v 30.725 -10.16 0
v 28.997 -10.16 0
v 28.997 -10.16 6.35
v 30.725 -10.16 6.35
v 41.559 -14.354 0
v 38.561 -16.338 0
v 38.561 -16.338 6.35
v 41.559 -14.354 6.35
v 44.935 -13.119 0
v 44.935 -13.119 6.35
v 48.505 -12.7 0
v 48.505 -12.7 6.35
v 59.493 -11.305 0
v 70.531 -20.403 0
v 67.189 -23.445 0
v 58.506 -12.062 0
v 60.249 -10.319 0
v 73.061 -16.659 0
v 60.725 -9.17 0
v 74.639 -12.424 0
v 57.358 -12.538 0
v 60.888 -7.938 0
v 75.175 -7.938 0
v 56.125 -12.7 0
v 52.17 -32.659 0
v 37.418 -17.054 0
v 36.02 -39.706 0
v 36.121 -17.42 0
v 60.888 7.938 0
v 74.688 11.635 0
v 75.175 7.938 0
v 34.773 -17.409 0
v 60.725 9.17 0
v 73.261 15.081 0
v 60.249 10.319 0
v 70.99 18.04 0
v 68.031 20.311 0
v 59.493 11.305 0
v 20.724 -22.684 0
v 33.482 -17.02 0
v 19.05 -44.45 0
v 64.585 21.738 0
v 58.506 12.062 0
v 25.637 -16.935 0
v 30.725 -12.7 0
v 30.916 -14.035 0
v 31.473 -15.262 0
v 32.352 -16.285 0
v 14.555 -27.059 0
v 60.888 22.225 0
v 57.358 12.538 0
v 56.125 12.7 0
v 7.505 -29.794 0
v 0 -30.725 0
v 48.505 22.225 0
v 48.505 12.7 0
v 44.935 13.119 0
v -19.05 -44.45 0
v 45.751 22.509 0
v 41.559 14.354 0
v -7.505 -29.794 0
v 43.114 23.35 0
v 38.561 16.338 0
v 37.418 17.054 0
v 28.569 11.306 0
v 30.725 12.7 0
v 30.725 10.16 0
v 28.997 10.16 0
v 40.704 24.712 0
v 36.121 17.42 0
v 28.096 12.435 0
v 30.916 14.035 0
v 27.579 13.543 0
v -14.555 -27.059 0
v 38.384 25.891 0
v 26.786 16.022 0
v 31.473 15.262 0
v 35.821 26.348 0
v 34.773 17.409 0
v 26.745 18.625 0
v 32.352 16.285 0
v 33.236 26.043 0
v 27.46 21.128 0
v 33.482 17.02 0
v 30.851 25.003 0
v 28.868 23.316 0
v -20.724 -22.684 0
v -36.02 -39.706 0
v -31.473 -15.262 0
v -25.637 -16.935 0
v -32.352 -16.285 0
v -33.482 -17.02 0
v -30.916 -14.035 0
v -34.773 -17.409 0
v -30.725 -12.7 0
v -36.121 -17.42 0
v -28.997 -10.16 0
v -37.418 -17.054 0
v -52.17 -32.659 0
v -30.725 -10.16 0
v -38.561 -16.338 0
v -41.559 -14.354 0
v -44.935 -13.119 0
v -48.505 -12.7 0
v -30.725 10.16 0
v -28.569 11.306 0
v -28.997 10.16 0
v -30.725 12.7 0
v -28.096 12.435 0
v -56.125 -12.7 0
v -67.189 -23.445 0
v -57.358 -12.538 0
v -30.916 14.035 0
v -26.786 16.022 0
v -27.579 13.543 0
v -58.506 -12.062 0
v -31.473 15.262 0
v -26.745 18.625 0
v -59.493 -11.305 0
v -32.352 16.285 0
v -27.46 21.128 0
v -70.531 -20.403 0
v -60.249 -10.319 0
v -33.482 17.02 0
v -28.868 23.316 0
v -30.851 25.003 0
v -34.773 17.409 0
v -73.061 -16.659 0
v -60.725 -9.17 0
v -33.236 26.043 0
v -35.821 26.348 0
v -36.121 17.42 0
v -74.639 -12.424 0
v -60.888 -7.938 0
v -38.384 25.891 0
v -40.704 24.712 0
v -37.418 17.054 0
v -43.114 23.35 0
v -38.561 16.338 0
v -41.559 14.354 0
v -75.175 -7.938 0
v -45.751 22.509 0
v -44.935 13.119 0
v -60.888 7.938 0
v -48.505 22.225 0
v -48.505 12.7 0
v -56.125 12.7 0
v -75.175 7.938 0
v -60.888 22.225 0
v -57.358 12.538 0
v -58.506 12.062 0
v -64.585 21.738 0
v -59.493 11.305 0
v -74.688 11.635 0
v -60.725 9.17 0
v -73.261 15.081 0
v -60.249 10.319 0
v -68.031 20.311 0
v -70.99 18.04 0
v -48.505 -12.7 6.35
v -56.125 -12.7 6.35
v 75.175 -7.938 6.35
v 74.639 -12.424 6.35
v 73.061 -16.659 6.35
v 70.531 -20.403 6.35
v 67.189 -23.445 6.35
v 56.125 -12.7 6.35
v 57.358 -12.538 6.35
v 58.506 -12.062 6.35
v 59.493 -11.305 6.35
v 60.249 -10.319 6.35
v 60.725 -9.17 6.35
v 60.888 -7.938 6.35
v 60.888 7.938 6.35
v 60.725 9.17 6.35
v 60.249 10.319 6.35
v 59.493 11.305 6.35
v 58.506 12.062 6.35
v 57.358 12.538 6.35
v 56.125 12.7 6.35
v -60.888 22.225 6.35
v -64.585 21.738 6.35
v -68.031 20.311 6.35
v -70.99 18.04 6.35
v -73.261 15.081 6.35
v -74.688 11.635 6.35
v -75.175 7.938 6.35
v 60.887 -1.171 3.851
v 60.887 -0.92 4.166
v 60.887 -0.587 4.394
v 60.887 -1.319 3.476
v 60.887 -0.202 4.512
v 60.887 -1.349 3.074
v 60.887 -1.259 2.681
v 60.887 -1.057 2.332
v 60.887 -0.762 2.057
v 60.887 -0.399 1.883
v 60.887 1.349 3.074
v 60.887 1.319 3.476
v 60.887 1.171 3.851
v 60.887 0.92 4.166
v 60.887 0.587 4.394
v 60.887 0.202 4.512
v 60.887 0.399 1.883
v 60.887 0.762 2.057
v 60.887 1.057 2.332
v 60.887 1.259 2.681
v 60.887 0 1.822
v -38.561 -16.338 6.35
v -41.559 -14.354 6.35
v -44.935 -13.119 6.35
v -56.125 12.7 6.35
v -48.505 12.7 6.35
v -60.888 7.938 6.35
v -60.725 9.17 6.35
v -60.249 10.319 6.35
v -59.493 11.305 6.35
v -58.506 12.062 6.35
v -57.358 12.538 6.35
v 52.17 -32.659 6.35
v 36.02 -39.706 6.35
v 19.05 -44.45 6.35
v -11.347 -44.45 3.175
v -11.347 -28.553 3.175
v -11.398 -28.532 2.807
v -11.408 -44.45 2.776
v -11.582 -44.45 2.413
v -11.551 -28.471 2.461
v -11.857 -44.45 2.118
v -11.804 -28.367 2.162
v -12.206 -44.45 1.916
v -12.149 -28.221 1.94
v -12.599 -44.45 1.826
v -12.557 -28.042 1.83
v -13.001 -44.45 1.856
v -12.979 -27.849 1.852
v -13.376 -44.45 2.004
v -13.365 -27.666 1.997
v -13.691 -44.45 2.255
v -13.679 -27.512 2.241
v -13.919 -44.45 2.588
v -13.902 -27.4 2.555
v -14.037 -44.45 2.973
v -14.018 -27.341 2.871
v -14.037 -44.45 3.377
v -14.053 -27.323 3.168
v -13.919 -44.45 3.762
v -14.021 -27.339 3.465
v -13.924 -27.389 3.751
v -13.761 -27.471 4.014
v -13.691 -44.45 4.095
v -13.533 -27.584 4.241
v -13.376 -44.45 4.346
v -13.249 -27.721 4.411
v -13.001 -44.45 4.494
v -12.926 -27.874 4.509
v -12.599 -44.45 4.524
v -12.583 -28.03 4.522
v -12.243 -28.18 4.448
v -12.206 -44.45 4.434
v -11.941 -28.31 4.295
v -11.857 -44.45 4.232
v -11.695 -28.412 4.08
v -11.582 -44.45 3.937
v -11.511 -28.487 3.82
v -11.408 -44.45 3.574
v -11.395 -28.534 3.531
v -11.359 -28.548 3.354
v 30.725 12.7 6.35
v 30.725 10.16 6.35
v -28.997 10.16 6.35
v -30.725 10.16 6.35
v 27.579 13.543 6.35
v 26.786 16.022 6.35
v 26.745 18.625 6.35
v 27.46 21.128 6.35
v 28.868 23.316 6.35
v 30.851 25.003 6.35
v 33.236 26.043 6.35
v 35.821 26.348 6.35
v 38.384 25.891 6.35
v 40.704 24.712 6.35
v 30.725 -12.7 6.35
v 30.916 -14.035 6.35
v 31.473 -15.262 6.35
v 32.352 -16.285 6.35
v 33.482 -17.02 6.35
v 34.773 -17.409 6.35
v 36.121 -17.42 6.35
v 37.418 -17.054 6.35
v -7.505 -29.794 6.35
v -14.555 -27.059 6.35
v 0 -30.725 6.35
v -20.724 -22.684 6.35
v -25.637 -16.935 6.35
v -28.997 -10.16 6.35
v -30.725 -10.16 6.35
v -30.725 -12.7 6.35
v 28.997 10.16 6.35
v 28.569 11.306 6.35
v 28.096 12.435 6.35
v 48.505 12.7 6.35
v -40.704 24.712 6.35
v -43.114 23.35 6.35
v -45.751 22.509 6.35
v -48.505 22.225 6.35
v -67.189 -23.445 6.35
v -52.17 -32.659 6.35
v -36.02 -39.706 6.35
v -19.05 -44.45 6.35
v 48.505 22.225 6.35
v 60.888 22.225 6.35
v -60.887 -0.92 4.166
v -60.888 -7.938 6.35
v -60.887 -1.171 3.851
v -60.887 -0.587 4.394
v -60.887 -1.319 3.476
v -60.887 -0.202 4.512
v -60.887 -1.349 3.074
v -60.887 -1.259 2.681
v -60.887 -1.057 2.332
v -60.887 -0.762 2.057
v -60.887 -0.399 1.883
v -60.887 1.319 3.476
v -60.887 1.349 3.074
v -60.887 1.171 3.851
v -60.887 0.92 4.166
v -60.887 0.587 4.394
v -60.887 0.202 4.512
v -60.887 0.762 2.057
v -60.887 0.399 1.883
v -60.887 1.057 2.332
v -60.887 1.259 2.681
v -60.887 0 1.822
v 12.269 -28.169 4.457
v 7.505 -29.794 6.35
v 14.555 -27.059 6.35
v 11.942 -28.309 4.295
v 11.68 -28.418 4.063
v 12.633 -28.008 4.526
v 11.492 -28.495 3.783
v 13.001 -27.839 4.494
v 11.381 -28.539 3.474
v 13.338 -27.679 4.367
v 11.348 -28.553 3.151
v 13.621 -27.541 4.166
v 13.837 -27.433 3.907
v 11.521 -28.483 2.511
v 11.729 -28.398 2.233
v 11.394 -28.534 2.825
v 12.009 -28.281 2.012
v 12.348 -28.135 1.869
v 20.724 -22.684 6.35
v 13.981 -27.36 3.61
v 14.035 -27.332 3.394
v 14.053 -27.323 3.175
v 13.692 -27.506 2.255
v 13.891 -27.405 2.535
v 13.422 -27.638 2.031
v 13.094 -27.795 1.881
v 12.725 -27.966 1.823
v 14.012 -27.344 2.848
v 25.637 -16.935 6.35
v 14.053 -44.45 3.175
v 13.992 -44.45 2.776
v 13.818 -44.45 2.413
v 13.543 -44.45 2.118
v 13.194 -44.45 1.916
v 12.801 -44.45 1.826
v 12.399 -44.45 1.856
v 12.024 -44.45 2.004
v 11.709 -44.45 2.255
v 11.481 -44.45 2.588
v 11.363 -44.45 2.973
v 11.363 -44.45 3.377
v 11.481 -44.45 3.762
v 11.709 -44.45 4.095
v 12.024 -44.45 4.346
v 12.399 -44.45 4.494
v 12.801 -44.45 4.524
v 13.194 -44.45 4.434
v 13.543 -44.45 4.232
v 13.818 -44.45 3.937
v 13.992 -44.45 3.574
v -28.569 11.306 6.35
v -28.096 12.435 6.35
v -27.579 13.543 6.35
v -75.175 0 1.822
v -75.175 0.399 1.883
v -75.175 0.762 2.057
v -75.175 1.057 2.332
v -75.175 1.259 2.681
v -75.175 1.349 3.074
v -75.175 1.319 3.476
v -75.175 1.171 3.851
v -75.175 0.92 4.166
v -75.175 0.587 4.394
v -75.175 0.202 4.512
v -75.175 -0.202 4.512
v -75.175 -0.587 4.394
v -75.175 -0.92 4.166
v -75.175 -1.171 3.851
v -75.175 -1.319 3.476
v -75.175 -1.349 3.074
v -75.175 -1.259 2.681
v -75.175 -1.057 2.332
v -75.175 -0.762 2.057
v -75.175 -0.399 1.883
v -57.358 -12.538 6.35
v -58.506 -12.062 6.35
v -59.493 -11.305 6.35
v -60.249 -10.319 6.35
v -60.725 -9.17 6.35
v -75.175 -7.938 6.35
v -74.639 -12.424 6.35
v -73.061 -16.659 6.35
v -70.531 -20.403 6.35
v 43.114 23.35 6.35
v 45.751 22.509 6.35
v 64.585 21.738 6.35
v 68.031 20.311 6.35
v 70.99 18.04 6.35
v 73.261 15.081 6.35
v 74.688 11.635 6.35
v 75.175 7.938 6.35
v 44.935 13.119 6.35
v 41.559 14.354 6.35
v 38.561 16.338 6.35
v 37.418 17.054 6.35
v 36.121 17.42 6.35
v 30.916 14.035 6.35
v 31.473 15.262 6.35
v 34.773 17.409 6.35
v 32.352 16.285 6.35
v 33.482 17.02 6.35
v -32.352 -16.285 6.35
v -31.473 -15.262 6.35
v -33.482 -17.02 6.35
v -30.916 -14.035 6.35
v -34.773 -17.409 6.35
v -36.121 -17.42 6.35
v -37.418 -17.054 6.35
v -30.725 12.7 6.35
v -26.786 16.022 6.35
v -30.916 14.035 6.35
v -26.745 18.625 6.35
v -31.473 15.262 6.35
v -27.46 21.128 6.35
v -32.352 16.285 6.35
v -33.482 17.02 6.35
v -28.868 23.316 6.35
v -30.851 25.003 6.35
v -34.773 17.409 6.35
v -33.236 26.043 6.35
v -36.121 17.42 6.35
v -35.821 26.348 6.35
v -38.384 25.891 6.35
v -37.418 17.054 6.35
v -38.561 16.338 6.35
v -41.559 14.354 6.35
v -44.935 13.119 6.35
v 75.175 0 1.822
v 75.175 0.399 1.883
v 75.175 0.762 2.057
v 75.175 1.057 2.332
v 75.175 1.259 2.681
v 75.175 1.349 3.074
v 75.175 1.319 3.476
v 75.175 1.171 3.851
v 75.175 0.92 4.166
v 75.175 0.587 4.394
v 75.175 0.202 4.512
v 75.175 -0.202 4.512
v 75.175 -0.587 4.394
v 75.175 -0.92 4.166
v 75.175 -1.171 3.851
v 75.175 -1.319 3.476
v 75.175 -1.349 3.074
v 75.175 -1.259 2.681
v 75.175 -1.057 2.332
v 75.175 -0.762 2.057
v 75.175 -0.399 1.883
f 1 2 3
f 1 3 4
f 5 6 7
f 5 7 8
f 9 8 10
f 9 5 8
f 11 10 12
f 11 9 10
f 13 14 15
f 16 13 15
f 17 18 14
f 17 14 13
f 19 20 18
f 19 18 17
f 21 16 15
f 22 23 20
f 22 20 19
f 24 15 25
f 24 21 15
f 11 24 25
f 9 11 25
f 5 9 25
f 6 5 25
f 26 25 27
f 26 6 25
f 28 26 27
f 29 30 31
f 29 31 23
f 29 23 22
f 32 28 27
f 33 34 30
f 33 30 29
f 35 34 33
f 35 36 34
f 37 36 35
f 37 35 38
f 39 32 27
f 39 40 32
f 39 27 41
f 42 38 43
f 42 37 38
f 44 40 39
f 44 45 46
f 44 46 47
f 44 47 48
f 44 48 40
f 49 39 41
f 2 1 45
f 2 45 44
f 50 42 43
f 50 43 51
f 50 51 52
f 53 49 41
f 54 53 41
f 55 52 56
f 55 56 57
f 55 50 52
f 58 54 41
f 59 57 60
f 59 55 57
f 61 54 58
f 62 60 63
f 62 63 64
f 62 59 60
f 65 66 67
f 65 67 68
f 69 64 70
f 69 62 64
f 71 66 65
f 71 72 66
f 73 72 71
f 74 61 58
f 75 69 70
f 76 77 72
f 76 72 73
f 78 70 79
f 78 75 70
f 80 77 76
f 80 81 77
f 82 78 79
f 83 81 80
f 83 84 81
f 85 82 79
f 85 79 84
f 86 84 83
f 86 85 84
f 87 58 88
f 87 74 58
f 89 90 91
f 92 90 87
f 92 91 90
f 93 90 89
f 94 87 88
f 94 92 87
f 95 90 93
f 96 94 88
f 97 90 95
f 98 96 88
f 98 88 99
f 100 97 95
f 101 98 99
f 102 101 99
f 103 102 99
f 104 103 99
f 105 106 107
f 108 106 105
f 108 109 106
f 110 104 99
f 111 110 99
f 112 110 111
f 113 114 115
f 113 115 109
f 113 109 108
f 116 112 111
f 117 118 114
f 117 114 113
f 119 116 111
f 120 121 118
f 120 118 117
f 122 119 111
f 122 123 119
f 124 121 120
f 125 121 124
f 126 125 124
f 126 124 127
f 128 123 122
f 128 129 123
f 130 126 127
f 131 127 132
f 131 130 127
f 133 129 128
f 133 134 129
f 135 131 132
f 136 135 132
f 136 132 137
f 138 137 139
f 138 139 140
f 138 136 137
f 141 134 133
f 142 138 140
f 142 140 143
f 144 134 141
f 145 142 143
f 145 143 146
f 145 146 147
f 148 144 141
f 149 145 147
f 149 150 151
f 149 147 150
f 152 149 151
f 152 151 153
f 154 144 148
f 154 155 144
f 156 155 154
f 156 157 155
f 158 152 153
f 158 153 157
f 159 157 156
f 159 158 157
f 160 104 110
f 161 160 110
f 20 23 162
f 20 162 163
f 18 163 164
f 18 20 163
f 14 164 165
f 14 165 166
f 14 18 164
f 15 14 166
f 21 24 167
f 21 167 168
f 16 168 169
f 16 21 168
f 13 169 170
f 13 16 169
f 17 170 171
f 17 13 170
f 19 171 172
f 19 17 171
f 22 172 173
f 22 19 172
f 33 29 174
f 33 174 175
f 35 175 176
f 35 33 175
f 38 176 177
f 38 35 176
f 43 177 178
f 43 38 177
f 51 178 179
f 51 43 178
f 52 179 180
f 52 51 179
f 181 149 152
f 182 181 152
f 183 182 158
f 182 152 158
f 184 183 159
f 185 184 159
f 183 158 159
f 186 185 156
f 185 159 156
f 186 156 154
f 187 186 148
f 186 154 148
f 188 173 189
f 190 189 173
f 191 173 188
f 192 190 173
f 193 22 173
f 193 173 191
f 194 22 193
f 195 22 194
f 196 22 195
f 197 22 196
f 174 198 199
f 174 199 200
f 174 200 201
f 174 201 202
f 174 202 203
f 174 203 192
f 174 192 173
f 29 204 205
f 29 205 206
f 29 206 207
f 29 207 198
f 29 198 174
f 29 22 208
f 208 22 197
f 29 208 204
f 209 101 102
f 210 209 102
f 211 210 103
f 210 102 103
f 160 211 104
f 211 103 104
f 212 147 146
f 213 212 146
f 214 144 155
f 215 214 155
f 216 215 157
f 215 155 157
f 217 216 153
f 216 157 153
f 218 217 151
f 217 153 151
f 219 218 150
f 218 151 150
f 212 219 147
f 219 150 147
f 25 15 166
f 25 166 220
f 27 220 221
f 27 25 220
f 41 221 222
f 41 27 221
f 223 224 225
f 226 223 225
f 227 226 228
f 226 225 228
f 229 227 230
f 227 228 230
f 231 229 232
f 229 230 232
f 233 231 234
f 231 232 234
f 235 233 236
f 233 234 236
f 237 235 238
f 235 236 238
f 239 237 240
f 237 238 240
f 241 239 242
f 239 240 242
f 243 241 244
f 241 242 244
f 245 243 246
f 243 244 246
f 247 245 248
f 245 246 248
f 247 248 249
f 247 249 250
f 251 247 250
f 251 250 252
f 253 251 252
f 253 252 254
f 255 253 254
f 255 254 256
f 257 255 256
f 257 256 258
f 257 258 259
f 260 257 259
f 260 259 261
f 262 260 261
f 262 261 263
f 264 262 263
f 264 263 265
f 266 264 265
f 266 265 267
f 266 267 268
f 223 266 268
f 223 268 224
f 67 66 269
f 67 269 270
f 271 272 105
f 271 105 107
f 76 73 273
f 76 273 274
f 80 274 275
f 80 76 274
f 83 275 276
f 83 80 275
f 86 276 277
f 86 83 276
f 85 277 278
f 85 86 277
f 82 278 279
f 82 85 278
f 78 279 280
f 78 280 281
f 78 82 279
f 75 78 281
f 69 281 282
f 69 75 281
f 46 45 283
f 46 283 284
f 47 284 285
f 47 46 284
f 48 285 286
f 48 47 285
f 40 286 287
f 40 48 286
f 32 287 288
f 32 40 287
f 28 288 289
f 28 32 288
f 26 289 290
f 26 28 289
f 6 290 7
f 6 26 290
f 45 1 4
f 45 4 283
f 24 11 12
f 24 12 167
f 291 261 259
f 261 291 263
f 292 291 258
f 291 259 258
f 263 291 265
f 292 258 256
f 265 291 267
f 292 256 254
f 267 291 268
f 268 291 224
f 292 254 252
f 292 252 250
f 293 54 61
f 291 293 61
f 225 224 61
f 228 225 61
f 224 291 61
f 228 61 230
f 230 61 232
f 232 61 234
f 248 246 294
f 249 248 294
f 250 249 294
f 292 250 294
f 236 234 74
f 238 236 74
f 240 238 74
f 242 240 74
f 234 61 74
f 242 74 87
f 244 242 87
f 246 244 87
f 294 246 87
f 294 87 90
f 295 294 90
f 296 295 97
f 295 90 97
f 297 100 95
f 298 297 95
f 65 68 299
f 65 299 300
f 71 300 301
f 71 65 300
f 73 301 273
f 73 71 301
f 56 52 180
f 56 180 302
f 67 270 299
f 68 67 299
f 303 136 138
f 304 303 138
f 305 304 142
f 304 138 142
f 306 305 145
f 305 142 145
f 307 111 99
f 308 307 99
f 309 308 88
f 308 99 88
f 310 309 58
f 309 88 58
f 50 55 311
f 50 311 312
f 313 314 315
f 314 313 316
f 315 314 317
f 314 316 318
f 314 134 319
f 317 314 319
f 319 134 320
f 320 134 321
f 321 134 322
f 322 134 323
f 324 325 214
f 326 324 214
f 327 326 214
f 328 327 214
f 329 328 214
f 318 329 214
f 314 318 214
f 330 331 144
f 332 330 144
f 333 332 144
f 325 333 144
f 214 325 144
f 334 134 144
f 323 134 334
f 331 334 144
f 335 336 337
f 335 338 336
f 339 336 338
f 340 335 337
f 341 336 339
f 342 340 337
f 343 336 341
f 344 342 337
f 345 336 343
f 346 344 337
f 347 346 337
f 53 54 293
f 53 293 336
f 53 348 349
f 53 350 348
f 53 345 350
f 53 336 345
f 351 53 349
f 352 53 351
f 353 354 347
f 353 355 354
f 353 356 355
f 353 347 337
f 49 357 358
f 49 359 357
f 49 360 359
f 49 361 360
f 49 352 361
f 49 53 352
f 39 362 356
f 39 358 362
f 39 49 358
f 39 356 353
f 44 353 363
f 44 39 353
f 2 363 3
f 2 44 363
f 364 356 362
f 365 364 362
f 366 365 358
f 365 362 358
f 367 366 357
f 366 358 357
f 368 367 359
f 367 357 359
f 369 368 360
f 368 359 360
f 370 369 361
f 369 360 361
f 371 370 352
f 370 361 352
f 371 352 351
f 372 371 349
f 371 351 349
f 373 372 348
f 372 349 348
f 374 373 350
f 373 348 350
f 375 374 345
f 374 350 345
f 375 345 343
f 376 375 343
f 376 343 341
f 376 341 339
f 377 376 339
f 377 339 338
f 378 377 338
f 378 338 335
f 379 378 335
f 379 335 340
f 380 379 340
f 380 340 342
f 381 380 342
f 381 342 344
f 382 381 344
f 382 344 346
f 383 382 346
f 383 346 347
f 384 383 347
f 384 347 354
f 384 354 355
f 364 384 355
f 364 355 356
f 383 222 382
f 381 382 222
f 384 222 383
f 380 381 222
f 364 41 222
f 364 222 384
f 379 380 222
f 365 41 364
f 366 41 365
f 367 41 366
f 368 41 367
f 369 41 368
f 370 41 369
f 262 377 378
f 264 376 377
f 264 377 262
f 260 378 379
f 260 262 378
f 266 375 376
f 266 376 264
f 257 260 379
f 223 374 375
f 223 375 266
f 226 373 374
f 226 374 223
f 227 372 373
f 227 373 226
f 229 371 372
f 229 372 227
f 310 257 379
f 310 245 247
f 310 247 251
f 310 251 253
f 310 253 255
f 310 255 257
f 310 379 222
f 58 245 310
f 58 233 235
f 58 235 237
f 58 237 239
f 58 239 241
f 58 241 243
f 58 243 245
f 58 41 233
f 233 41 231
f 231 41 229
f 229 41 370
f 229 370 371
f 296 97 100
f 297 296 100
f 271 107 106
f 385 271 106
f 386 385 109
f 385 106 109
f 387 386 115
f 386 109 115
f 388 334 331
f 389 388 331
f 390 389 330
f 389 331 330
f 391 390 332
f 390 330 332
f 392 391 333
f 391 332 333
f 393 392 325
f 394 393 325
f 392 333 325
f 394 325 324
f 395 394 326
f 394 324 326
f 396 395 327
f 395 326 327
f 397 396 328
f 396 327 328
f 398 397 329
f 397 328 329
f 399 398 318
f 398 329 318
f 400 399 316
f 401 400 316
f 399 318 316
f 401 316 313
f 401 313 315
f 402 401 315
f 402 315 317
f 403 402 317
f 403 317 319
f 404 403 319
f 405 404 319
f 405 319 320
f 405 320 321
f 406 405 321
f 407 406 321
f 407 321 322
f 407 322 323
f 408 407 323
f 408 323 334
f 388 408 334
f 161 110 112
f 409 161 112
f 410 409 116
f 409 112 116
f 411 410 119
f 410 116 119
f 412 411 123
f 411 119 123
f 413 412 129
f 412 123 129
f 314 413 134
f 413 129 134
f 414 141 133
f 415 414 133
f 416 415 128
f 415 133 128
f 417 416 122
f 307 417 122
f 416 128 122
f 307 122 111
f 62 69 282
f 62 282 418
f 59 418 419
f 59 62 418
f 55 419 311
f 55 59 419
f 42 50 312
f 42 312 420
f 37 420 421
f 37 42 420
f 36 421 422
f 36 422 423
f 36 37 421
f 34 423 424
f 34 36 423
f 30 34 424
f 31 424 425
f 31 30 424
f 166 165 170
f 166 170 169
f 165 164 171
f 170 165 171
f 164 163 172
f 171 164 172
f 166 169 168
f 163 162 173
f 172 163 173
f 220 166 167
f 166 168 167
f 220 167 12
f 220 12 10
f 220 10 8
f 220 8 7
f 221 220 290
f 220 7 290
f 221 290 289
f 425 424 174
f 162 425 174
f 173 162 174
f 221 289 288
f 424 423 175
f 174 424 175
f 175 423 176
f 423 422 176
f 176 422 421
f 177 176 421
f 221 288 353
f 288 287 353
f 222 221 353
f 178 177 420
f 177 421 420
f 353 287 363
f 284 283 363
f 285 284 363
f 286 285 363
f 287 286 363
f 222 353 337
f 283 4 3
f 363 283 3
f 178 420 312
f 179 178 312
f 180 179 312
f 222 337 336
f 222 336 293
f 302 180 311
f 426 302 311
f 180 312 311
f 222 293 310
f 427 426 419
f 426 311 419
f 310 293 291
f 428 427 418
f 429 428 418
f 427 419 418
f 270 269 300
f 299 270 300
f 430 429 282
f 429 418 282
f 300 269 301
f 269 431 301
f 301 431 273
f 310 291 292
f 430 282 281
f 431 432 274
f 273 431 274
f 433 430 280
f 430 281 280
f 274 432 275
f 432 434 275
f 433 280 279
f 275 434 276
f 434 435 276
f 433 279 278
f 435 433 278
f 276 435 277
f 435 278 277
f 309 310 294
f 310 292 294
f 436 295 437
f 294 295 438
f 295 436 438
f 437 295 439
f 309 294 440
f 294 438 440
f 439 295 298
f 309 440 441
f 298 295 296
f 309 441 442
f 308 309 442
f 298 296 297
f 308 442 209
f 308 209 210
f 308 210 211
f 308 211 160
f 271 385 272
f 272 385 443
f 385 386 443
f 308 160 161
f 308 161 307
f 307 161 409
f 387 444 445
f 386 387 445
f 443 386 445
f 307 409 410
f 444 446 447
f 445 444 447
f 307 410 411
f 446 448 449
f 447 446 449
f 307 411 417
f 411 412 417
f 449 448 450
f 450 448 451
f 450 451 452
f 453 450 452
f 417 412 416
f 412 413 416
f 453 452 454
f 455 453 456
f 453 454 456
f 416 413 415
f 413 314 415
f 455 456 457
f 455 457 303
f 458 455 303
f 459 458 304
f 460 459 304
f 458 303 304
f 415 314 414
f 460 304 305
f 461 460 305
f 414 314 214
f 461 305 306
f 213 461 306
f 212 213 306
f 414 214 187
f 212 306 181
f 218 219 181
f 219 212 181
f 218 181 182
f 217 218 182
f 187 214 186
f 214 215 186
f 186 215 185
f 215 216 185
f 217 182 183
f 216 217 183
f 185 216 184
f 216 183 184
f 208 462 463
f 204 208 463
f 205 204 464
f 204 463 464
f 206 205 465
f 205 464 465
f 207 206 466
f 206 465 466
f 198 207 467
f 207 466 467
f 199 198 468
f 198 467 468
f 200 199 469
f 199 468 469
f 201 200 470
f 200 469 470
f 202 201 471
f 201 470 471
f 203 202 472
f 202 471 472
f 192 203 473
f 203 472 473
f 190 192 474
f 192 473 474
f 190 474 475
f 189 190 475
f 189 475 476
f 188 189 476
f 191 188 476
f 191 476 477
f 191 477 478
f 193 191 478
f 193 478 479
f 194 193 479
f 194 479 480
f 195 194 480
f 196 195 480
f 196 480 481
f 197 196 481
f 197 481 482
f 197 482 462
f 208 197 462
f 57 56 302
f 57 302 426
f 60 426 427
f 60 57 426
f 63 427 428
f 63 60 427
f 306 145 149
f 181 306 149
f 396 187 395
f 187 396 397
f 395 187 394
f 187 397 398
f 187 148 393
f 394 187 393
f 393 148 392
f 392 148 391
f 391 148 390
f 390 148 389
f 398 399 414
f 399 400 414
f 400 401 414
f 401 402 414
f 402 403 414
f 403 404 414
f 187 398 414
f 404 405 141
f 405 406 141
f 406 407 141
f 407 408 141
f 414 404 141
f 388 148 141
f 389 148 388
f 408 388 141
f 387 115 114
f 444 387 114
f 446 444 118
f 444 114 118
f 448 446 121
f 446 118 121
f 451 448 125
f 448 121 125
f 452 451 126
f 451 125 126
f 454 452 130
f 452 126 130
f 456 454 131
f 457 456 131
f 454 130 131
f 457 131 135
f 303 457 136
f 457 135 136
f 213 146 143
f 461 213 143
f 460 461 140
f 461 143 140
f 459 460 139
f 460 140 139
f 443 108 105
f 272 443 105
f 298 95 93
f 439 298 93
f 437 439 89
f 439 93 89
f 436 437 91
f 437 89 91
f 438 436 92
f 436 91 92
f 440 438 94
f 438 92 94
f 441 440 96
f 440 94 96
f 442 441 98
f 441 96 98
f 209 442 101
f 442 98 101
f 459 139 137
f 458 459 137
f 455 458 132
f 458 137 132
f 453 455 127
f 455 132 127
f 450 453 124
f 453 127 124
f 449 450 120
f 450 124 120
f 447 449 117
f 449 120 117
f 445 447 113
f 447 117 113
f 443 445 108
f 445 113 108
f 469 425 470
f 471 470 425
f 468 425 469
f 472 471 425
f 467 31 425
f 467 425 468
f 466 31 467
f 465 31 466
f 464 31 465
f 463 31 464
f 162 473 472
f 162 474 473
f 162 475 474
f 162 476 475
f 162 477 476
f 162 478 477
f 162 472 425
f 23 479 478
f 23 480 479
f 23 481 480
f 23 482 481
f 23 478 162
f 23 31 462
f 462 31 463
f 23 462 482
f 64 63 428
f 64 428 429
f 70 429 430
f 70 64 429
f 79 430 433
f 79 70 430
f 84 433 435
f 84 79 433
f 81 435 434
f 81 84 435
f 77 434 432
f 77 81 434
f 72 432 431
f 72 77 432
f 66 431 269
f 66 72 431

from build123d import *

# Parameters (mm, degrees)
BOSS_EXTRUDE1_DEPTH   = 6.35
F_6_32_TAPPED_HOLE2_D = 2.7051
F_6_32_TAPPED_HOLE1_D = 2.7051


with BuildPart() as part:
    # Sketch1 → Boss-Extrude1 (new body)
    with BuildSketch(Plane.XY):
        with BuildLine():
            Line((-30.725, 12.7), (-30.725, 10.16))
            Line((-30.725, 10.16), (-28.99655195, 10.16))
            ThreePointArc((-28.99655195, 10.16), (-28.338337344, 11.872837132), (-27.579048351, 13.5433274))
            ThreePointArc((-27.579048351, 13.5433274), (-29.797475058, 24.232437752), (-40.703834208, 24.711840767))
            ThreePointArc((-40.703834208, 24.711840767), (-44.411023794, 22.861749744), (-48.505, 22.225))
            Line((-48.505, 22.225), (-60.8875, 22.225))
            ThreePointArc((-60.8875, 22.225), (-70.990288136, 18.040288136), (-75.175, 7.9375))
            Line((-75.175, 7.9375), (-75.175, -7.9375))
            ThreePointArc((-75.175, -7.9375), (-73.061327111, -16.658929011), (-67.189349187, -23.445003896))
            ThreePointArc((-67.189349187, -23.445003896), (-44.21739693, -36.463267178), (-19.05, -44.45))
            Line((-19.05, -44.45), (0, -44.45))
            Line((0, -44.45), (0, -30.725))
            ThreePointArc((0, -30.725), (-17.774414547, -25.061839767), (-28.99655195, -10.16))
            Line((-28.99655195, -10.16), (-30.725, -10.16))
            Line((-30.725, -10.16), (-30.725, -12.7))
            ThreePointArc((-30.725, -12.7), (-33.481957403, -17.019630209), (-38.560886674, -16.338090241))
            ThreePointArc((-38.560886674, -16.338090241), (-43.210637658, -13.638076264), (-48.505, -12.7))
            Line((-48.505, -12.7), (-56.125, -12.7))
            ThreePointArc((-56.125, -12.7), (-59.492596045, -11.305096045), (-60.8875, -7.9375))
            Line((-60.8875, -7.9375), (-60.8875, 7.9375))
            ThreePointArc((-60.8875, 7.9375), (-59.492596045, 11.305096045), (-56.125, 12.7))
            Line((-56.125, 12.7), (-48.505, 12.7))
            ThreePointArc((-48.505, 12.7), (-43.210637658, 13.638076264), (-38.560886674, 16.338090241))
            ThreePointArc((-38.560886674, 16.338090241), (-33.481957403, 17.019630209), (-30.725, 12.7))
        make_face()
    boss_extrude1 = extrude(amount=BOSS_EXTRUDE1_DEPTH)

    # Mirror1: Boss-Extrude1 across plane
    add(boss_extrude1.mirror(Plane(origin=(0, -30.725, 6.35), x_dir=(0, 0, 1), z_dir=(-1, 0, 0))))

    # #6-32 Tapped Hole2 (through all)
    with Locations(Plane(origin=(0, -44.45, 0), x_dir=(-1, 0, 0), z_dir=(0, -1, 0))):
        with Locations((-12.7, -3.175), (12.7, -3.175)):
            Hole(F_6_32_TAPPED_HOLE2_D / 2)

    # #6-32 Tapped Hole1 (through all)
    with Locations(Plane.ZY.offset(75.175)):
        with Locations((3.175, 0)):
            Hole(F_6_32_TAPPED_HOLE1_D / 2)


solid = part.part
